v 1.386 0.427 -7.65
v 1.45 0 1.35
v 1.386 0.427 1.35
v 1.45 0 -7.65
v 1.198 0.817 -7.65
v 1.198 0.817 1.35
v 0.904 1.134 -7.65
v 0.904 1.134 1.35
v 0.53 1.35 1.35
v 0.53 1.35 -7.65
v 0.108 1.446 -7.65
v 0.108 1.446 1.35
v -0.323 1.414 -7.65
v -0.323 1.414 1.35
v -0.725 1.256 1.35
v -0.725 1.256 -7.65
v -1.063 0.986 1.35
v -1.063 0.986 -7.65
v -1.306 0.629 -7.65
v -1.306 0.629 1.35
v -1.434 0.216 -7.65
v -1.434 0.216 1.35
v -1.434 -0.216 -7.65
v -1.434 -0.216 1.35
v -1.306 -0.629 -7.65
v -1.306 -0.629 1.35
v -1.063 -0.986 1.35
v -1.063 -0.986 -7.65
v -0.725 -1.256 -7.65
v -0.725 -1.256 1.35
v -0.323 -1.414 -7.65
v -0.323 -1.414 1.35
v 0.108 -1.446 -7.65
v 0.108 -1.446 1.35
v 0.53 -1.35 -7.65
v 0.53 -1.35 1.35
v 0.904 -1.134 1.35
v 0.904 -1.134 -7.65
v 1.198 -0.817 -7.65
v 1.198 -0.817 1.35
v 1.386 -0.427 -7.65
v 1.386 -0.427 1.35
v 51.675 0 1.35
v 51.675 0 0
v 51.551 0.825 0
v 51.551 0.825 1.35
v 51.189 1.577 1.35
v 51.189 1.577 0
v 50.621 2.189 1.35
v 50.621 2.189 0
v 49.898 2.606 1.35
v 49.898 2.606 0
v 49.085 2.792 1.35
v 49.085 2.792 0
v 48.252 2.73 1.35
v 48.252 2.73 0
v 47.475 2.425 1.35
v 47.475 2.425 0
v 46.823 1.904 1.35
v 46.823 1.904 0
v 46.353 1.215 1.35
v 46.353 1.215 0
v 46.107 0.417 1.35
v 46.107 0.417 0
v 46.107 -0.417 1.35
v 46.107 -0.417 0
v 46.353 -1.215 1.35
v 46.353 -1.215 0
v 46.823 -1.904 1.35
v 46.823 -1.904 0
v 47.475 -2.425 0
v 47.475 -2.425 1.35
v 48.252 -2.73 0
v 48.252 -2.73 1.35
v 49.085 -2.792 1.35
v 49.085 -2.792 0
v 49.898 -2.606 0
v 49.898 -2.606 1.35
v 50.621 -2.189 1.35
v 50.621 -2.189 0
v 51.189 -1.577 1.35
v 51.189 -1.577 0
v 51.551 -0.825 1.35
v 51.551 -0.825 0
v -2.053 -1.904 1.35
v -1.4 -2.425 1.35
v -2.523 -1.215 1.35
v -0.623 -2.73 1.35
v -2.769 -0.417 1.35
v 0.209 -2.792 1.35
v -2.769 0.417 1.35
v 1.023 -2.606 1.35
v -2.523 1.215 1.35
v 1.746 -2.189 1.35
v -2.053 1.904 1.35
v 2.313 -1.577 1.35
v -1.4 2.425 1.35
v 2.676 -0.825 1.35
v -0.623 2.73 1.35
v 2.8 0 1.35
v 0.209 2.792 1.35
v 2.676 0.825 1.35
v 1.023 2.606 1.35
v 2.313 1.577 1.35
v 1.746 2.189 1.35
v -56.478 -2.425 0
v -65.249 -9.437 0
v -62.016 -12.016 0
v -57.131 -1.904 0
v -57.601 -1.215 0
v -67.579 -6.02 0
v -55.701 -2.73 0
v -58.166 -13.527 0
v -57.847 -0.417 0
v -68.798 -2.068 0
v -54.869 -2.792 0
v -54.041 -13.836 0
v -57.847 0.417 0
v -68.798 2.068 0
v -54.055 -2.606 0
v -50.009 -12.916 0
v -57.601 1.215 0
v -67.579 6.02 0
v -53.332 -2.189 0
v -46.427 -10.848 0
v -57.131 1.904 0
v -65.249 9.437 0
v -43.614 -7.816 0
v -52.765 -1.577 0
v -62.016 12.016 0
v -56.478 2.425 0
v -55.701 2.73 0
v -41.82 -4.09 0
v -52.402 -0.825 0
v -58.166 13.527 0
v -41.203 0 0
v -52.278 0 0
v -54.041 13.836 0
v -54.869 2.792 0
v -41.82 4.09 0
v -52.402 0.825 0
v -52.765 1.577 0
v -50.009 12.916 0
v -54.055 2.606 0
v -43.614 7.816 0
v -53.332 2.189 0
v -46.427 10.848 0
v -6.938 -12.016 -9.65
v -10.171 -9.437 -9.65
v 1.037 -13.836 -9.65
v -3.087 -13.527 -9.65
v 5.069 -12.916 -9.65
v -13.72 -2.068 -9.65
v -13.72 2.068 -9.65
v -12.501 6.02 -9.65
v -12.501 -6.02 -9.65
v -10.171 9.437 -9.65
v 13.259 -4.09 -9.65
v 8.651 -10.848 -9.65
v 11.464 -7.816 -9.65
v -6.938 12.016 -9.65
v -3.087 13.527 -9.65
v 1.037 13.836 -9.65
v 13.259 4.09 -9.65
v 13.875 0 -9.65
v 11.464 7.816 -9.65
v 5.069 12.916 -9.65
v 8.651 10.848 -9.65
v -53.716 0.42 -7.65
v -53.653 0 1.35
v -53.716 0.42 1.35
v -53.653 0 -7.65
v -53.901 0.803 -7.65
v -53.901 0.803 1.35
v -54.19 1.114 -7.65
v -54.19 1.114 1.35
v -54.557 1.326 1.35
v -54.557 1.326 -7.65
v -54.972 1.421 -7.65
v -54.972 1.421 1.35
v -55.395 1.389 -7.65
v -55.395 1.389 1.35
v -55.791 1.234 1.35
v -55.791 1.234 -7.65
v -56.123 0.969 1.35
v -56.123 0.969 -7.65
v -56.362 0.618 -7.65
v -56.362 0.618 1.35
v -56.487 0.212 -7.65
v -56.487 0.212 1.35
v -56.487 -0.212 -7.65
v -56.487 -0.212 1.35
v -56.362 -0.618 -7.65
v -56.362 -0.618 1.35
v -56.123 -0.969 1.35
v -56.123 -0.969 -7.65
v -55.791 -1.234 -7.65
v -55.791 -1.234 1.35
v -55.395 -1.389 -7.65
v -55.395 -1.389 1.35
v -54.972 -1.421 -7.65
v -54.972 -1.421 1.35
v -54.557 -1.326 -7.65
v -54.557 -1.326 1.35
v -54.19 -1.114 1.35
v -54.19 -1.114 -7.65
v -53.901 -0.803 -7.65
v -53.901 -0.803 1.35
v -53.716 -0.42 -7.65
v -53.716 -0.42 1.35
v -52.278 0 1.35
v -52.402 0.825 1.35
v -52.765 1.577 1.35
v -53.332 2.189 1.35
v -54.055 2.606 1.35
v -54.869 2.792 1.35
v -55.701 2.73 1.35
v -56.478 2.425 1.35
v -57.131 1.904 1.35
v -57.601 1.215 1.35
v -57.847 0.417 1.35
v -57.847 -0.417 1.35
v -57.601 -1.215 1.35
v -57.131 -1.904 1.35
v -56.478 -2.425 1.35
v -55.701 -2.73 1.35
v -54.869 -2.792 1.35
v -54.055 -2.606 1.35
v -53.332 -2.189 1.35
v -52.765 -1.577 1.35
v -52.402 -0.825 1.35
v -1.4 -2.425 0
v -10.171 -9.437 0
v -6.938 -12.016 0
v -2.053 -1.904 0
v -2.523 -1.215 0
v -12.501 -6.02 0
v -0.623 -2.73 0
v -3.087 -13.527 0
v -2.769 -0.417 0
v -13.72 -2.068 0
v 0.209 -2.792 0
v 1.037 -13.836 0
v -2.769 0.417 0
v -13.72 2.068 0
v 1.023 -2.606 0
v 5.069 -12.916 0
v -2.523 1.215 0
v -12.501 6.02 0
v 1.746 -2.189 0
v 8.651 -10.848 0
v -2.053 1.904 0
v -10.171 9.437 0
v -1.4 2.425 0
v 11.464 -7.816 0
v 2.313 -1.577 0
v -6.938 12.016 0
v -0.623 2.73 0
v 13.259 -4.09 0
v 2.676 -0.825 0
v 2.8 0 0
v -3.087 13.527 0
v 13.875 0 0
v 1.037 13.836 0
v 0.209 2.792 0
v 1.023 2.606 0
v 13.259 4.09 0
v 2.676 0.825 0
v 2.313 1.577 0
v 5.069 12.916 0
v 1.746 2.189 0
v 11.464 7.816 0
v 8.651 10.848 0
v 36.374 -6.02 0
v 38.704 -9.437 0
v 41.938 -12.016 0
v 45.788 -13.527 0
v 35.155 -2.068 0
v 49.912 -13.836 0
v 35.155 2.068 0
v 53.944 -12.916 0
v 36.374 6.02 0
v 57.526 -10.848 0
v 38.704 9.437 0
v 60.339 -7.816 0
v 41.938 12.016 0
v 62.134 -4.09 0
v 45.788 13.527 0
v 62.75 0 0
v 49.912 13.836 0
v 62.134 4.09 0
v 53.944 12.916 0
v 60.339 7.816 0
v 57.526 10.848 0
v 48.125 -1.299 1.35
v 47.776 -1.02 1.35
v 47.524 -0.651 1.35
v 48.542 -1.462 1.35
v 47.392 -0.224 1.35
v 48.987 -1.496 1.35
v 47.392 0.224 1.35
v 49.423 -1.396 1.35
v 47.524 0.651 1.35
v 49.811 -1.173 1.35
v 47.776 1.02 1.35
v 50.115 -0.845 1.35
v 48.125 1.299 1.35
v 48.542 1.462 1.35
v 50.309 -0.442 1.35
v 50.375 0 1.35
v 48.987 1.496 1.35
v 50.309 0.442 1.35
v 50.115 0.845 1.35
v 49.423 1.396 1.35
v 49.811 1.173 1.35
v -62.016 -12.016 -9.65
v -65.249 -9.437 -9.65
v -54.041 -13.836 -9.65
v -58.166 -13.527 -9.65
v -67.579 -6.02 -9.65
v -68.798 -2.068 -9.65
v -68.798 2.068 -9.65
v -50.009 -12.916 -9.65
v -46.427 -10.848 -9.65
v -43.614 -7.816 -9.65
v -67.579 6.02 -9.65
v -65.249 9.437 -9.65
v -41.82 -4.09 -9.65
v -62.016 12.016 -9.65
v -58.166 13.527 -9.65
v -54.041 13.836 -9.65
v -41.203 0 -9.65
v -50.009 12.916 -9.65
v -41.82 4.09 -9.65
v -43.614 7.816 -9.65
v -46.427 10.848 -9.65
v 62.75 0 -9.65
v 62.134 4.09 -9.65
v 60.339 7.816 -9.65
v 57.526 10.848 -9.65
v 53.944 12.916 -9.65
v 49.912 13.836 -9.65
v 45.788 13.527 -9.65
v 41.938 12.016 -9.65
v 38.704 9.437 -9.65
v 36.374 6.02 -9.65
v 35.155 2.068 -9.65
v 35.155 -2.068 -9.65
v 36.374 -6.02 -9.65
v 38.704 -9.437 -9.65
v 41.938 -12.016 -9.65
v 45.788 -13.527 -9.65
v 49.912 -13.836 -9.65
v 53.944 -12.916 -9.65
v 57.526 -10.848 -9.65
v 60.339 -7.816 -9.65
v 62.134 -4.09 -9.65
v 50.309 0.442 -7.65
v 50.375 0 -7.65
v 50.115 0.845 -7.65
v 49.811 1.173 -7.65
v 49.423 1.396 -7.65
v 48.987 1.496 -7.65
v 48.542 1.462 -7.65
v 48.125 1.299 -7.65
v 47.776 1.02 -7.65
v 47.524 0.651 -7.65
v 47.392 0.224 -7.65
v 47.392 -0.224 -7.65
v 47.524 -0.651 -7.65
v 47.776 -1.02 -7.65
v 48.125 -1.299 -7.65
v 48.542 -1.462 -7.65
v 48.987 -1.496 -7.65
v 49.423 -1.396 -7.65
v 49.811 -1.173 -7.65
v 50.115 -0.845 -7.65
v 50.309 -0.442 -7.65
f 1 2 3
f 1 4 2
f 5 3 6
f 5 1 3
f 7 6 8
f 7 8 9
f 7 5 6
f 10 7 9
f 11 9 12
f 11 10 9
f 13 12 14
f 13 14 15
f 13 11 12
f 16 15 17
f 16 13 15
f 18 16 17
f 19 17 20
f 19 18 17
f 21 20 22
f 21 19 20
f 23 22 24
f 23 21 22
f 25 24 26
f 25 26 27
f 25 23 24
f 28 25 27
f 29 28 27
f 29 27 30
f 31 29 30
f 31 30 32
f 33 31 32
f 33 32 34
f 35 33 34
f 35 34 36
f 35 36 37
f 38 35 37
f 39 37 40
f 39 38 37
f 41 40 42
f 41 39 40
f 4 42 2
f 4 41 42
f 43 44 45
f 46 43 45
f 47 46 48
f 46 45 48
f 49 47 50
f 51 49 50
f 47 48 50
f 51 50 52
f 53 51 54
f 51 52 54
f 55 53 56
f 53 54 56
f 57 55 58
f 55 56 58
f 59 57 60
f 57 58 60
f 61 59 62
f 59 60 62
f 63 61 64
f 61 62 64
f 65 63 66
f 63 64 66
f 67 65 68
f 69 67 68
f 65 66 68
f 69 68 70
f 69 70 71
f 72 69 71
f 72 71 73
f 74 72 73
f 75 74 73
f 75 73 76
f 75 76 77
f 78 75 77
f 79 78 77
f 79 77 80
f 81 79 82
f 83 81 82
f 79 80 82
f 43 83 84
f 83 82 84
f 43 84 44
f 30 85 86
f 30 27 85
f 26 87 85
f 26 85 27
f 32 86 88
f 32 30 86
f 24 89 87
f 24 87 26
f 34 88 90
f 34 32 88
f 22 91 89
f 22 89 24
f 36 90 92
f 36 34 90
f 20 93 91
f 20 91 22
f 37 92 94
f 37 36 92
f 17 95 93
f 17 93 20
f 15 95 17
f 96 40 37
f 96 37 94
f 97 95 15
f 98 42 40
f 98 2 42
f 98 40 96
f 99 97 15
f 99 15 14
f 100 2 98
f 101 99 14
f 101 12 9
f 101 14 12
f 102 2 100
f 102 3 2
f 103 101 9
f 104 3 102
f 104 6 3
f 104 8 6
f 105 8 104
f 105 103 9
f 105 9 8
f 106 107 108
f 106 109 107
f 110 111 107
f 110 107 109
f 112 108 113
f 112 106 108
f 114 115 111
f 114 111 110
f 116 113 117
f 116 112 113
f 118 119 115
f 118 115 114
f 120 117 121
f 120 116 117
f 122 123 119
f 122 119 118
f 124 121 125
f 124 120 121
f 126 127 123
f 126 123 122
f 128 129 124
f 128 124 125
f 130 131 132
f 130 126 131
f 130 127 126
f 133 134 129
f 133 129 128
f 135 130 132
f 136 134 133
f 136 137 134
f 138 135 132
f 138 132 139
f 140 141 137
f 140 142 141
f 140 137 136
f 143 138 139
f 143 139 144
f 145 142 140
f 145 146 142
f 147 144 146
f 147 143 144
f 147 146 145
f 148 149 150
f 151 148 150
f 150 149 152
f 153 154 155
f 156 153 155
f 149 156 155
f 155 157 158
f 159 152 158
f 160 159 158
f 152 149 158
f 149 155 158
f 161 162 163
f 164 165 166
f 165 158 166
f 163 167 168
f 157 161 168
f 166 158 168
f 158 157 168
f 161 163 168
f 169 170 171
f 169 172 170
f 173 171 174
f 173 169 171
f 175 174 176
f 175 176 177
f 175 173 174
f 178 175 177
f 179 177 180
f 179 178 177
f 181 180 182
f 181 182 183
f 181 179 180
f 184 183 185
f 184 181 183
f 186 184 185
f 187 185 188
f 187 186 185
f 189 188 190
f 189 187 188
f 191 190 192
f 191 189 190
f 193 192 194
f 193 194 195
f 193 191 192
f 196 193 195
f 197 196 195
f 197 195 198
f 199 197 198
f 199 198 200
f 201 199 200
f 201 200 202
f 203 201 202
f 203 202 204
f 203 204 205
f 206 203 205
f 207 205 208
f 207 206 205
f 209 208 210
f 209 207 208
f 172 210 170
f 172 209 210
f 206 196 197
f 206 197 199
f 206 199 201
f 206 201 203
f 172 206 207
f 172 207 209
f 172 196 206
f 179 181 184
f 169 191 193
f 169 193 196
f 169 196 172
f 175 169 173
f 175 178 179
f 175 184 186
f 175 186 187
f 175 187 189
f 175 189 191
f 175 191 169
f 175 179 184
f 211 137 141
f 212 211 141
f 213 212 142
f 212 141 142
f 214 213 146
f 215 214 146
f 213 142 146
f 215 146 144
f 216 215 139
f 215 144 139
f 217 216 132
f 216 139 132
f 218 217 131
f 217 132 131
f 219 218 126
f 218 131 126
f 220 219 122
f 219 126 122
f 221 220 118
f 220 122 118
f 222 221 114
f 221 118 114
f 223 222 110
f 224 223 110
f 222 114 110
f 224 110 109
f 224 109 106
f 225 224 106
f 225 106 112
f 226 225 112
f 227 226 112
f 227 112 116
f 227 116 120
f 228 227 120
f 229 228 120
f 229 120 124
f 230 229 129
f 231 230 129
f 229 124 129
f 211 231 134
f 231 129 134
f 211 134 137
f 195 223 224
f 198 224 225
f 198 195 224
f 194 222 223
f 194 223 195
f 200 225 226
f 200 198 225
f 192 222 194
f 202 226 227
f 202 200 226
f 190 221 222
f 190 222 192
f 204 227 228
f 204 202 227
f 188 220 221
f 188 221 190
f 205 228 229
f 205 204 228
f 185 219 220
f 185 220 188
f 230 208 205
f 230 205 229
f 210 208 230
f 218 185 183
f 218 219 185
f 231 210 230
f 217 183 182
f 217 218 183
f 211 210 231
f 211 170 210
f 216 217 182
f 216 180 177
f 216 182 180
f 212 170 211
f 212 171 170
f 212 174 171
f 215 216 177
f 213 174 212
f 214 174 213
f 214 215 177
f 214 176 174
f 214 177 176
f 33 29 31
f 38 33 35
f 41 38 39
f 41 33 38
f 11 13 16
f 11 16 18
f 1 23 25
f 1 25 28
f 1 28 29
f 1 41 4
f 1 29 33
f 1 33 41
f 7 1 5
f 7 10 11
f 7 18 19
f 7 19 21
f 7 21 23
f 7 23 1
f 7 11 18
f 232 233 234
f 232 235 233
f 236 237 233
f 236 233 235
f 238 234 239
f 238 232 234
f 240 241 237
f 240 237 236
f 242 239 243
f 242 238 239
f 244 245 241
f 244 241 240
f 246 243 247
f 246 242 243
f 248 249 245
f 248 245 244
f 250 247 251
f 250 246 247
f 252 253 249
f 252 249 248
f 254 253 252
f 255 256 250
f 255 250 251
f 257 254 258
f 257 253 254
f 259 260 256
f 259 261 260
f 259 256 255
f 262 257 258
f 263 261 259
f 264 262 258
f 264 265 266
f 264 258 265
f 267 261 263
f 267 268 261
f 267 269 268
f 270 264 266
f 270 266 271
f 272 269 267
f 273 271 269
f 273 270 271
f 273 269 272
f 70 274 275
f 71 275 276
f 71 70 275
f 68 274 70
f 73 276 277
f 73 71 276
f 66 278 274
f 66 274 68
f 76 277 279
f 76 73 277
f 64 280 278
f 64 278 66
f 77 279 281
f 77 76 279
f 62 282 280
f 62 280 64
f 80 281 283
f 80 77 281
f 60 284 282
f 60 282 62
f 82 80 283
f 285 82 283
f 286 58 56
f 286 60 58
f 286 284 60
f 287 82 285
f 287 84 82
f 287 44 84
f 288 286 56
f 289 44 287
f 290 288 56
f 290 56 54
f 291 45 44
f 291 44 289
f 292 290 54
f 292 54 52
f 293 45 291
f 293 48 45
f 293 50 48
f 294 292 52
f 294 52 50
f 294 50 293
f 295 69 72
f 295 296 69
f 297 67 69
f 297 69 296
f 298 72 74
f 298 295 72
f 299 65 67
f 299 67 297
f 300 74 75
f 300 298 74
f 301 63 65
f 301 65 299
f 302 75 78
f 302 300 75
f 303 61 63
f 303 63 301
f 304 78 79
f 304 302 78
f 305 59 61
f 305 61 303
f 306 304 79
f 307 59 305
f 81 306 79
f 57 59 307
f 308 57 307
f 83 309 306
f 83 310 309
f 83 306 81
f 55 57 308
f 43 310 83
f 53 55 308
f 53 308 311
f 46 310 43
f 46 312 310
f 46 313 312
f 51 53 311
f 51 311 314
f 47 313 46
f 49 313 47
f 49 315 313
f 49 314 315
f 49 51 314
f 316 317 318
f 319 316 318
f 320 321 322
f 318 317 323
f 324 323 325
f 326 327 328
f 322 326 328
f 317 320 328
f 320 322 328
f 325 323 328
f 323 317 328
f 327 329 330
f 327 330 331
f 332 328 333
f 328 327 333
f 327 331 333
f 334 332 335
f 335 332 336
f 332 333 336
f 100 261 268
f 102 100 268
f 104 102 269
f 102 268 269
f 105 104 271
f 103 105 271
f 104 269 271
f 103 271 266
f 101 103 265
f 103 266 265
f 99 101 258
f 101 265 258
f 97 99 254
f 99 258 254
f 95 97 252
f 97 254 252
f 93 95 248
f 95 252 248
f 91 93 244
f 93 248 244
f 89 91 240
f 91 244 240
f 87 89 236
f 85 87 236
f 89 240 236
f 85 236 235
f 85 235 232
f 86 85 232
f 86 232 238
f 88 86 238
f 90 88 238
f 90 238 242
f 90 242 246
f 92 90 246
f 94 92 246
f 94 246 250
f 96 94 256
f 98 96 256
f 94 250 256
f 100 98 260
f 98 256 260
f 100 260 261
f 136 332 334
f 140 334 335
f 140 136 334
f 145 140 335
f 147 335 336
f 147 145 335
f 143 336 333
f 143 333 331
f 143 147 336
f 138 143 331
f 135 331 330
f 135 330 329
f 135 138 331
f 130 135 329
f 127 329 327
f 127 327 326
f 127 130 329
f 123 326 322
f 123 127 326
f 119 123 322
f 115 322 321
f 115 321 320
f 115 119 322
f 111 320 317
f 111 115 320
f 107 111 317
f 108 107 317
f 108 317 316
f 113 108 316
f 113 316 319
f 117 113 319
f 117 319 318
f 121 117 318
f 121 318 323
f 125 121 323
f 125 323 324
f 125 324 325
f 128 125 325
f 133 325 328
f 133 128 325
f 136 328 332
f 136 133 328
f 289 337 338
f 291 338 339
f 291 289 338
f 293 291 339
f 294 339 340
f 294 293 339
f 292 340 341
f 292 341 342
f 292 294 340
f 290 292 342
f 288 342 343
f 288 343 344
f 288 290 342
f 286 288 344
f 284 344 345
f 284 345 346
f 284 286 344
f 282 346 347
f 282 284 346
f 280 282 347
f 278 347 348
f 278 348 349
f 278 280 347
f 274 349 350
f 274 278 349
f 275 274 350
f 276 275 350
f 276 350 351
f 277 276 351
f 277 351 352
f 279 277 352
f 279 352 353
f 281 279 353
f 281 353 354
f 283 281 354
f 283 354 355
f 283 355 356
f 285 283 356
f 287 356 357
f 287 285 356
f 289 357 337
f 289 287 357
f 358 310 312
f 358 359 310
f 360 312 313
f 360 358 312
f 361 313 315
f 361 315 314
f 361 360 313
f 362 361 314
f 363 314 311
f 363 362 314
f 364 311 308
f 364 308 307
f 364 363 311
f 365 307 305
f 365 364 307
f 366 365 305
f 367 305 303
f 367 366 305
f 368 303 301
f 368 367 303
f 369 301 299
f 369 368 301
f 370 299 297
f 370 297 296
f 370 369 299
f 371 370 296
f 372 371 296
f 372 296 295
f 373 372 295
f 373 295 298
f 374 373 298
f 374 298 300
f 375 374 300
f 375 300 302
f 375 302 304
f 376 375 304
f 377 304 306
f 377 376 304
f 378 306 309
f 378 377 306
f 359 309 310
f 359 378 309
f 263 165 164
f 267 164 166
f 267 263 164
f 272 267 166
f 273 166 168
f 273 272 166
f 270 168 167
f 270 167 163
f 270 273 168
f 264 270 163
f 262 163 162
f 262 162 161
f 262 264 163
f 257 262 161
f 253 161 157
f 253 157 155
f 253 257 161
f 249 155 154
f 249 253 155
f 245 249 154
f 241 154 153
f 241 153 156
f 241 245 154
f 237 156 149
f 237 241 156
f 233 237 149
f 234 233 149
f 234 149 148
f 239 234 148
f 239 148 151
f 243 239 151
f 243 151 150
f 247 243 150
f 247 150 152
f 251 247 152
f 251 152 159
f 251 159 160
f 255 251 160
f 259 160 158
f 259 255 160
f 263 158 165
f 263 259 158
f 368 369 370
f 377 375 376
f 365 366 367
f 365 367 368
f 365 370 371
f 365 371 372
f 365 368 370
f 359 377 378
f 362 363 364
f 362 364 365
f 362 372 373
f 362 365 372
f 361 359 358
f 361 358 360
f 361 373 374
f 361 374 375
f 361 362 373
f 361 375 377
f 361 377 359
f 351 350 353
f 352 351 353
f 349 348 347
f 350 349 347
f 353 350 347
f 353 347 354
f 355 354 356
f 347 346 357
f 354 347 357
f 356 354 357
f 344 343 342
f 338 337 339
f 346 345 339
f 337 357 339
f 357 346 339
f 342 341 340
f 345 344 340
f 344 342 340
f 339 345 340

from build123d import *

# Parameters (mm, degrees)
F0_R     = 13.875
F0_R_2   = 2.8
F0_R_3   = 1.45
F0_R_4   = 1.425
F0_R_5   = 1.5
F1_DEPTH = 9.65
F2_DEPTH = 1.35
F3_DEPTH = 7.65


with BuildPart() as f1:
    # F0 (on Top) → F1 (new body)
    with BuildSketch(Plane.XY):
        Circle(F0_R)
        Circle(F0_R_2, mode=Mode.SUBTRACT)
        with Locations((48.875336, 0)):
            Circle(F0_R)
        with Locations((48.875336, 0)):
            Circle(F0_R_2, mode=Mode.SUBTRACT)
        with Locations((-55.078089, 0)):
            Circle(F0_R)
        with Locations((-55.078089, 0)):
            Circle(F0_R_2, mode=Mode.SUBTRACT)
        Circle(F0_R_2)
        Circle(F0_R_3, mode=Mode.SUBTRACT)
        Circle(F0_R_3)
        with Locations((-55.078089, 0)):
            Circle(F0_R_2)
        with Locations((-55.078089, 0)):
            Circle(F0_R_4, mode=Mode.SUBTRACT)
        with Locations((-55.078089, 0)):
            Circle(F0_R_4)
        with Locations((48.875336, 0)):
            Circle(F0_R_2)
        with Locations((48.875336, 0)):
            Circle(F0_R_5, mode=Mode.SUBTRACT)
        with Locations((48.875336, 0)):
            Circle(F0_R_5)
    extrude(amount=-F1_DEPTH)

    # F0 (on Top) → F2 (join)
    with BuildSketch(Plane.XY):
        Circle(F0_R_2)
        Circle(F0_R_3, mode=Mode.SUBTRACT)
        with Locations((48.875336, 0)):
            Circle(F0_R_2)
        with Locations((48.875336, 0)):
            Circle(F0_R_5, mode=Mode.SUBTRACT)
        with Locations((-55.078089, 0)):
            Circle(F0_R_2)
        with Locations((-55.078089, 0)):
            Circle(F0_R_4, mode=Mode.SUBTRACT)
    extrude(amount=F2_DEPTH)

    # F0 (on Top) → F3 (cut)
    with BuildSketch(Plane.XY):
        Circle(F0_R_3)
        with Locations((-55.078089, 0)):
            Circle(F0_R_4)
        with Locations((48.875336, 0)):
            Circle(F0_R_5)
    extrude(amount=-F3_DEPTH, mode=Mode.SUBTRACT)


solid = f1.part
